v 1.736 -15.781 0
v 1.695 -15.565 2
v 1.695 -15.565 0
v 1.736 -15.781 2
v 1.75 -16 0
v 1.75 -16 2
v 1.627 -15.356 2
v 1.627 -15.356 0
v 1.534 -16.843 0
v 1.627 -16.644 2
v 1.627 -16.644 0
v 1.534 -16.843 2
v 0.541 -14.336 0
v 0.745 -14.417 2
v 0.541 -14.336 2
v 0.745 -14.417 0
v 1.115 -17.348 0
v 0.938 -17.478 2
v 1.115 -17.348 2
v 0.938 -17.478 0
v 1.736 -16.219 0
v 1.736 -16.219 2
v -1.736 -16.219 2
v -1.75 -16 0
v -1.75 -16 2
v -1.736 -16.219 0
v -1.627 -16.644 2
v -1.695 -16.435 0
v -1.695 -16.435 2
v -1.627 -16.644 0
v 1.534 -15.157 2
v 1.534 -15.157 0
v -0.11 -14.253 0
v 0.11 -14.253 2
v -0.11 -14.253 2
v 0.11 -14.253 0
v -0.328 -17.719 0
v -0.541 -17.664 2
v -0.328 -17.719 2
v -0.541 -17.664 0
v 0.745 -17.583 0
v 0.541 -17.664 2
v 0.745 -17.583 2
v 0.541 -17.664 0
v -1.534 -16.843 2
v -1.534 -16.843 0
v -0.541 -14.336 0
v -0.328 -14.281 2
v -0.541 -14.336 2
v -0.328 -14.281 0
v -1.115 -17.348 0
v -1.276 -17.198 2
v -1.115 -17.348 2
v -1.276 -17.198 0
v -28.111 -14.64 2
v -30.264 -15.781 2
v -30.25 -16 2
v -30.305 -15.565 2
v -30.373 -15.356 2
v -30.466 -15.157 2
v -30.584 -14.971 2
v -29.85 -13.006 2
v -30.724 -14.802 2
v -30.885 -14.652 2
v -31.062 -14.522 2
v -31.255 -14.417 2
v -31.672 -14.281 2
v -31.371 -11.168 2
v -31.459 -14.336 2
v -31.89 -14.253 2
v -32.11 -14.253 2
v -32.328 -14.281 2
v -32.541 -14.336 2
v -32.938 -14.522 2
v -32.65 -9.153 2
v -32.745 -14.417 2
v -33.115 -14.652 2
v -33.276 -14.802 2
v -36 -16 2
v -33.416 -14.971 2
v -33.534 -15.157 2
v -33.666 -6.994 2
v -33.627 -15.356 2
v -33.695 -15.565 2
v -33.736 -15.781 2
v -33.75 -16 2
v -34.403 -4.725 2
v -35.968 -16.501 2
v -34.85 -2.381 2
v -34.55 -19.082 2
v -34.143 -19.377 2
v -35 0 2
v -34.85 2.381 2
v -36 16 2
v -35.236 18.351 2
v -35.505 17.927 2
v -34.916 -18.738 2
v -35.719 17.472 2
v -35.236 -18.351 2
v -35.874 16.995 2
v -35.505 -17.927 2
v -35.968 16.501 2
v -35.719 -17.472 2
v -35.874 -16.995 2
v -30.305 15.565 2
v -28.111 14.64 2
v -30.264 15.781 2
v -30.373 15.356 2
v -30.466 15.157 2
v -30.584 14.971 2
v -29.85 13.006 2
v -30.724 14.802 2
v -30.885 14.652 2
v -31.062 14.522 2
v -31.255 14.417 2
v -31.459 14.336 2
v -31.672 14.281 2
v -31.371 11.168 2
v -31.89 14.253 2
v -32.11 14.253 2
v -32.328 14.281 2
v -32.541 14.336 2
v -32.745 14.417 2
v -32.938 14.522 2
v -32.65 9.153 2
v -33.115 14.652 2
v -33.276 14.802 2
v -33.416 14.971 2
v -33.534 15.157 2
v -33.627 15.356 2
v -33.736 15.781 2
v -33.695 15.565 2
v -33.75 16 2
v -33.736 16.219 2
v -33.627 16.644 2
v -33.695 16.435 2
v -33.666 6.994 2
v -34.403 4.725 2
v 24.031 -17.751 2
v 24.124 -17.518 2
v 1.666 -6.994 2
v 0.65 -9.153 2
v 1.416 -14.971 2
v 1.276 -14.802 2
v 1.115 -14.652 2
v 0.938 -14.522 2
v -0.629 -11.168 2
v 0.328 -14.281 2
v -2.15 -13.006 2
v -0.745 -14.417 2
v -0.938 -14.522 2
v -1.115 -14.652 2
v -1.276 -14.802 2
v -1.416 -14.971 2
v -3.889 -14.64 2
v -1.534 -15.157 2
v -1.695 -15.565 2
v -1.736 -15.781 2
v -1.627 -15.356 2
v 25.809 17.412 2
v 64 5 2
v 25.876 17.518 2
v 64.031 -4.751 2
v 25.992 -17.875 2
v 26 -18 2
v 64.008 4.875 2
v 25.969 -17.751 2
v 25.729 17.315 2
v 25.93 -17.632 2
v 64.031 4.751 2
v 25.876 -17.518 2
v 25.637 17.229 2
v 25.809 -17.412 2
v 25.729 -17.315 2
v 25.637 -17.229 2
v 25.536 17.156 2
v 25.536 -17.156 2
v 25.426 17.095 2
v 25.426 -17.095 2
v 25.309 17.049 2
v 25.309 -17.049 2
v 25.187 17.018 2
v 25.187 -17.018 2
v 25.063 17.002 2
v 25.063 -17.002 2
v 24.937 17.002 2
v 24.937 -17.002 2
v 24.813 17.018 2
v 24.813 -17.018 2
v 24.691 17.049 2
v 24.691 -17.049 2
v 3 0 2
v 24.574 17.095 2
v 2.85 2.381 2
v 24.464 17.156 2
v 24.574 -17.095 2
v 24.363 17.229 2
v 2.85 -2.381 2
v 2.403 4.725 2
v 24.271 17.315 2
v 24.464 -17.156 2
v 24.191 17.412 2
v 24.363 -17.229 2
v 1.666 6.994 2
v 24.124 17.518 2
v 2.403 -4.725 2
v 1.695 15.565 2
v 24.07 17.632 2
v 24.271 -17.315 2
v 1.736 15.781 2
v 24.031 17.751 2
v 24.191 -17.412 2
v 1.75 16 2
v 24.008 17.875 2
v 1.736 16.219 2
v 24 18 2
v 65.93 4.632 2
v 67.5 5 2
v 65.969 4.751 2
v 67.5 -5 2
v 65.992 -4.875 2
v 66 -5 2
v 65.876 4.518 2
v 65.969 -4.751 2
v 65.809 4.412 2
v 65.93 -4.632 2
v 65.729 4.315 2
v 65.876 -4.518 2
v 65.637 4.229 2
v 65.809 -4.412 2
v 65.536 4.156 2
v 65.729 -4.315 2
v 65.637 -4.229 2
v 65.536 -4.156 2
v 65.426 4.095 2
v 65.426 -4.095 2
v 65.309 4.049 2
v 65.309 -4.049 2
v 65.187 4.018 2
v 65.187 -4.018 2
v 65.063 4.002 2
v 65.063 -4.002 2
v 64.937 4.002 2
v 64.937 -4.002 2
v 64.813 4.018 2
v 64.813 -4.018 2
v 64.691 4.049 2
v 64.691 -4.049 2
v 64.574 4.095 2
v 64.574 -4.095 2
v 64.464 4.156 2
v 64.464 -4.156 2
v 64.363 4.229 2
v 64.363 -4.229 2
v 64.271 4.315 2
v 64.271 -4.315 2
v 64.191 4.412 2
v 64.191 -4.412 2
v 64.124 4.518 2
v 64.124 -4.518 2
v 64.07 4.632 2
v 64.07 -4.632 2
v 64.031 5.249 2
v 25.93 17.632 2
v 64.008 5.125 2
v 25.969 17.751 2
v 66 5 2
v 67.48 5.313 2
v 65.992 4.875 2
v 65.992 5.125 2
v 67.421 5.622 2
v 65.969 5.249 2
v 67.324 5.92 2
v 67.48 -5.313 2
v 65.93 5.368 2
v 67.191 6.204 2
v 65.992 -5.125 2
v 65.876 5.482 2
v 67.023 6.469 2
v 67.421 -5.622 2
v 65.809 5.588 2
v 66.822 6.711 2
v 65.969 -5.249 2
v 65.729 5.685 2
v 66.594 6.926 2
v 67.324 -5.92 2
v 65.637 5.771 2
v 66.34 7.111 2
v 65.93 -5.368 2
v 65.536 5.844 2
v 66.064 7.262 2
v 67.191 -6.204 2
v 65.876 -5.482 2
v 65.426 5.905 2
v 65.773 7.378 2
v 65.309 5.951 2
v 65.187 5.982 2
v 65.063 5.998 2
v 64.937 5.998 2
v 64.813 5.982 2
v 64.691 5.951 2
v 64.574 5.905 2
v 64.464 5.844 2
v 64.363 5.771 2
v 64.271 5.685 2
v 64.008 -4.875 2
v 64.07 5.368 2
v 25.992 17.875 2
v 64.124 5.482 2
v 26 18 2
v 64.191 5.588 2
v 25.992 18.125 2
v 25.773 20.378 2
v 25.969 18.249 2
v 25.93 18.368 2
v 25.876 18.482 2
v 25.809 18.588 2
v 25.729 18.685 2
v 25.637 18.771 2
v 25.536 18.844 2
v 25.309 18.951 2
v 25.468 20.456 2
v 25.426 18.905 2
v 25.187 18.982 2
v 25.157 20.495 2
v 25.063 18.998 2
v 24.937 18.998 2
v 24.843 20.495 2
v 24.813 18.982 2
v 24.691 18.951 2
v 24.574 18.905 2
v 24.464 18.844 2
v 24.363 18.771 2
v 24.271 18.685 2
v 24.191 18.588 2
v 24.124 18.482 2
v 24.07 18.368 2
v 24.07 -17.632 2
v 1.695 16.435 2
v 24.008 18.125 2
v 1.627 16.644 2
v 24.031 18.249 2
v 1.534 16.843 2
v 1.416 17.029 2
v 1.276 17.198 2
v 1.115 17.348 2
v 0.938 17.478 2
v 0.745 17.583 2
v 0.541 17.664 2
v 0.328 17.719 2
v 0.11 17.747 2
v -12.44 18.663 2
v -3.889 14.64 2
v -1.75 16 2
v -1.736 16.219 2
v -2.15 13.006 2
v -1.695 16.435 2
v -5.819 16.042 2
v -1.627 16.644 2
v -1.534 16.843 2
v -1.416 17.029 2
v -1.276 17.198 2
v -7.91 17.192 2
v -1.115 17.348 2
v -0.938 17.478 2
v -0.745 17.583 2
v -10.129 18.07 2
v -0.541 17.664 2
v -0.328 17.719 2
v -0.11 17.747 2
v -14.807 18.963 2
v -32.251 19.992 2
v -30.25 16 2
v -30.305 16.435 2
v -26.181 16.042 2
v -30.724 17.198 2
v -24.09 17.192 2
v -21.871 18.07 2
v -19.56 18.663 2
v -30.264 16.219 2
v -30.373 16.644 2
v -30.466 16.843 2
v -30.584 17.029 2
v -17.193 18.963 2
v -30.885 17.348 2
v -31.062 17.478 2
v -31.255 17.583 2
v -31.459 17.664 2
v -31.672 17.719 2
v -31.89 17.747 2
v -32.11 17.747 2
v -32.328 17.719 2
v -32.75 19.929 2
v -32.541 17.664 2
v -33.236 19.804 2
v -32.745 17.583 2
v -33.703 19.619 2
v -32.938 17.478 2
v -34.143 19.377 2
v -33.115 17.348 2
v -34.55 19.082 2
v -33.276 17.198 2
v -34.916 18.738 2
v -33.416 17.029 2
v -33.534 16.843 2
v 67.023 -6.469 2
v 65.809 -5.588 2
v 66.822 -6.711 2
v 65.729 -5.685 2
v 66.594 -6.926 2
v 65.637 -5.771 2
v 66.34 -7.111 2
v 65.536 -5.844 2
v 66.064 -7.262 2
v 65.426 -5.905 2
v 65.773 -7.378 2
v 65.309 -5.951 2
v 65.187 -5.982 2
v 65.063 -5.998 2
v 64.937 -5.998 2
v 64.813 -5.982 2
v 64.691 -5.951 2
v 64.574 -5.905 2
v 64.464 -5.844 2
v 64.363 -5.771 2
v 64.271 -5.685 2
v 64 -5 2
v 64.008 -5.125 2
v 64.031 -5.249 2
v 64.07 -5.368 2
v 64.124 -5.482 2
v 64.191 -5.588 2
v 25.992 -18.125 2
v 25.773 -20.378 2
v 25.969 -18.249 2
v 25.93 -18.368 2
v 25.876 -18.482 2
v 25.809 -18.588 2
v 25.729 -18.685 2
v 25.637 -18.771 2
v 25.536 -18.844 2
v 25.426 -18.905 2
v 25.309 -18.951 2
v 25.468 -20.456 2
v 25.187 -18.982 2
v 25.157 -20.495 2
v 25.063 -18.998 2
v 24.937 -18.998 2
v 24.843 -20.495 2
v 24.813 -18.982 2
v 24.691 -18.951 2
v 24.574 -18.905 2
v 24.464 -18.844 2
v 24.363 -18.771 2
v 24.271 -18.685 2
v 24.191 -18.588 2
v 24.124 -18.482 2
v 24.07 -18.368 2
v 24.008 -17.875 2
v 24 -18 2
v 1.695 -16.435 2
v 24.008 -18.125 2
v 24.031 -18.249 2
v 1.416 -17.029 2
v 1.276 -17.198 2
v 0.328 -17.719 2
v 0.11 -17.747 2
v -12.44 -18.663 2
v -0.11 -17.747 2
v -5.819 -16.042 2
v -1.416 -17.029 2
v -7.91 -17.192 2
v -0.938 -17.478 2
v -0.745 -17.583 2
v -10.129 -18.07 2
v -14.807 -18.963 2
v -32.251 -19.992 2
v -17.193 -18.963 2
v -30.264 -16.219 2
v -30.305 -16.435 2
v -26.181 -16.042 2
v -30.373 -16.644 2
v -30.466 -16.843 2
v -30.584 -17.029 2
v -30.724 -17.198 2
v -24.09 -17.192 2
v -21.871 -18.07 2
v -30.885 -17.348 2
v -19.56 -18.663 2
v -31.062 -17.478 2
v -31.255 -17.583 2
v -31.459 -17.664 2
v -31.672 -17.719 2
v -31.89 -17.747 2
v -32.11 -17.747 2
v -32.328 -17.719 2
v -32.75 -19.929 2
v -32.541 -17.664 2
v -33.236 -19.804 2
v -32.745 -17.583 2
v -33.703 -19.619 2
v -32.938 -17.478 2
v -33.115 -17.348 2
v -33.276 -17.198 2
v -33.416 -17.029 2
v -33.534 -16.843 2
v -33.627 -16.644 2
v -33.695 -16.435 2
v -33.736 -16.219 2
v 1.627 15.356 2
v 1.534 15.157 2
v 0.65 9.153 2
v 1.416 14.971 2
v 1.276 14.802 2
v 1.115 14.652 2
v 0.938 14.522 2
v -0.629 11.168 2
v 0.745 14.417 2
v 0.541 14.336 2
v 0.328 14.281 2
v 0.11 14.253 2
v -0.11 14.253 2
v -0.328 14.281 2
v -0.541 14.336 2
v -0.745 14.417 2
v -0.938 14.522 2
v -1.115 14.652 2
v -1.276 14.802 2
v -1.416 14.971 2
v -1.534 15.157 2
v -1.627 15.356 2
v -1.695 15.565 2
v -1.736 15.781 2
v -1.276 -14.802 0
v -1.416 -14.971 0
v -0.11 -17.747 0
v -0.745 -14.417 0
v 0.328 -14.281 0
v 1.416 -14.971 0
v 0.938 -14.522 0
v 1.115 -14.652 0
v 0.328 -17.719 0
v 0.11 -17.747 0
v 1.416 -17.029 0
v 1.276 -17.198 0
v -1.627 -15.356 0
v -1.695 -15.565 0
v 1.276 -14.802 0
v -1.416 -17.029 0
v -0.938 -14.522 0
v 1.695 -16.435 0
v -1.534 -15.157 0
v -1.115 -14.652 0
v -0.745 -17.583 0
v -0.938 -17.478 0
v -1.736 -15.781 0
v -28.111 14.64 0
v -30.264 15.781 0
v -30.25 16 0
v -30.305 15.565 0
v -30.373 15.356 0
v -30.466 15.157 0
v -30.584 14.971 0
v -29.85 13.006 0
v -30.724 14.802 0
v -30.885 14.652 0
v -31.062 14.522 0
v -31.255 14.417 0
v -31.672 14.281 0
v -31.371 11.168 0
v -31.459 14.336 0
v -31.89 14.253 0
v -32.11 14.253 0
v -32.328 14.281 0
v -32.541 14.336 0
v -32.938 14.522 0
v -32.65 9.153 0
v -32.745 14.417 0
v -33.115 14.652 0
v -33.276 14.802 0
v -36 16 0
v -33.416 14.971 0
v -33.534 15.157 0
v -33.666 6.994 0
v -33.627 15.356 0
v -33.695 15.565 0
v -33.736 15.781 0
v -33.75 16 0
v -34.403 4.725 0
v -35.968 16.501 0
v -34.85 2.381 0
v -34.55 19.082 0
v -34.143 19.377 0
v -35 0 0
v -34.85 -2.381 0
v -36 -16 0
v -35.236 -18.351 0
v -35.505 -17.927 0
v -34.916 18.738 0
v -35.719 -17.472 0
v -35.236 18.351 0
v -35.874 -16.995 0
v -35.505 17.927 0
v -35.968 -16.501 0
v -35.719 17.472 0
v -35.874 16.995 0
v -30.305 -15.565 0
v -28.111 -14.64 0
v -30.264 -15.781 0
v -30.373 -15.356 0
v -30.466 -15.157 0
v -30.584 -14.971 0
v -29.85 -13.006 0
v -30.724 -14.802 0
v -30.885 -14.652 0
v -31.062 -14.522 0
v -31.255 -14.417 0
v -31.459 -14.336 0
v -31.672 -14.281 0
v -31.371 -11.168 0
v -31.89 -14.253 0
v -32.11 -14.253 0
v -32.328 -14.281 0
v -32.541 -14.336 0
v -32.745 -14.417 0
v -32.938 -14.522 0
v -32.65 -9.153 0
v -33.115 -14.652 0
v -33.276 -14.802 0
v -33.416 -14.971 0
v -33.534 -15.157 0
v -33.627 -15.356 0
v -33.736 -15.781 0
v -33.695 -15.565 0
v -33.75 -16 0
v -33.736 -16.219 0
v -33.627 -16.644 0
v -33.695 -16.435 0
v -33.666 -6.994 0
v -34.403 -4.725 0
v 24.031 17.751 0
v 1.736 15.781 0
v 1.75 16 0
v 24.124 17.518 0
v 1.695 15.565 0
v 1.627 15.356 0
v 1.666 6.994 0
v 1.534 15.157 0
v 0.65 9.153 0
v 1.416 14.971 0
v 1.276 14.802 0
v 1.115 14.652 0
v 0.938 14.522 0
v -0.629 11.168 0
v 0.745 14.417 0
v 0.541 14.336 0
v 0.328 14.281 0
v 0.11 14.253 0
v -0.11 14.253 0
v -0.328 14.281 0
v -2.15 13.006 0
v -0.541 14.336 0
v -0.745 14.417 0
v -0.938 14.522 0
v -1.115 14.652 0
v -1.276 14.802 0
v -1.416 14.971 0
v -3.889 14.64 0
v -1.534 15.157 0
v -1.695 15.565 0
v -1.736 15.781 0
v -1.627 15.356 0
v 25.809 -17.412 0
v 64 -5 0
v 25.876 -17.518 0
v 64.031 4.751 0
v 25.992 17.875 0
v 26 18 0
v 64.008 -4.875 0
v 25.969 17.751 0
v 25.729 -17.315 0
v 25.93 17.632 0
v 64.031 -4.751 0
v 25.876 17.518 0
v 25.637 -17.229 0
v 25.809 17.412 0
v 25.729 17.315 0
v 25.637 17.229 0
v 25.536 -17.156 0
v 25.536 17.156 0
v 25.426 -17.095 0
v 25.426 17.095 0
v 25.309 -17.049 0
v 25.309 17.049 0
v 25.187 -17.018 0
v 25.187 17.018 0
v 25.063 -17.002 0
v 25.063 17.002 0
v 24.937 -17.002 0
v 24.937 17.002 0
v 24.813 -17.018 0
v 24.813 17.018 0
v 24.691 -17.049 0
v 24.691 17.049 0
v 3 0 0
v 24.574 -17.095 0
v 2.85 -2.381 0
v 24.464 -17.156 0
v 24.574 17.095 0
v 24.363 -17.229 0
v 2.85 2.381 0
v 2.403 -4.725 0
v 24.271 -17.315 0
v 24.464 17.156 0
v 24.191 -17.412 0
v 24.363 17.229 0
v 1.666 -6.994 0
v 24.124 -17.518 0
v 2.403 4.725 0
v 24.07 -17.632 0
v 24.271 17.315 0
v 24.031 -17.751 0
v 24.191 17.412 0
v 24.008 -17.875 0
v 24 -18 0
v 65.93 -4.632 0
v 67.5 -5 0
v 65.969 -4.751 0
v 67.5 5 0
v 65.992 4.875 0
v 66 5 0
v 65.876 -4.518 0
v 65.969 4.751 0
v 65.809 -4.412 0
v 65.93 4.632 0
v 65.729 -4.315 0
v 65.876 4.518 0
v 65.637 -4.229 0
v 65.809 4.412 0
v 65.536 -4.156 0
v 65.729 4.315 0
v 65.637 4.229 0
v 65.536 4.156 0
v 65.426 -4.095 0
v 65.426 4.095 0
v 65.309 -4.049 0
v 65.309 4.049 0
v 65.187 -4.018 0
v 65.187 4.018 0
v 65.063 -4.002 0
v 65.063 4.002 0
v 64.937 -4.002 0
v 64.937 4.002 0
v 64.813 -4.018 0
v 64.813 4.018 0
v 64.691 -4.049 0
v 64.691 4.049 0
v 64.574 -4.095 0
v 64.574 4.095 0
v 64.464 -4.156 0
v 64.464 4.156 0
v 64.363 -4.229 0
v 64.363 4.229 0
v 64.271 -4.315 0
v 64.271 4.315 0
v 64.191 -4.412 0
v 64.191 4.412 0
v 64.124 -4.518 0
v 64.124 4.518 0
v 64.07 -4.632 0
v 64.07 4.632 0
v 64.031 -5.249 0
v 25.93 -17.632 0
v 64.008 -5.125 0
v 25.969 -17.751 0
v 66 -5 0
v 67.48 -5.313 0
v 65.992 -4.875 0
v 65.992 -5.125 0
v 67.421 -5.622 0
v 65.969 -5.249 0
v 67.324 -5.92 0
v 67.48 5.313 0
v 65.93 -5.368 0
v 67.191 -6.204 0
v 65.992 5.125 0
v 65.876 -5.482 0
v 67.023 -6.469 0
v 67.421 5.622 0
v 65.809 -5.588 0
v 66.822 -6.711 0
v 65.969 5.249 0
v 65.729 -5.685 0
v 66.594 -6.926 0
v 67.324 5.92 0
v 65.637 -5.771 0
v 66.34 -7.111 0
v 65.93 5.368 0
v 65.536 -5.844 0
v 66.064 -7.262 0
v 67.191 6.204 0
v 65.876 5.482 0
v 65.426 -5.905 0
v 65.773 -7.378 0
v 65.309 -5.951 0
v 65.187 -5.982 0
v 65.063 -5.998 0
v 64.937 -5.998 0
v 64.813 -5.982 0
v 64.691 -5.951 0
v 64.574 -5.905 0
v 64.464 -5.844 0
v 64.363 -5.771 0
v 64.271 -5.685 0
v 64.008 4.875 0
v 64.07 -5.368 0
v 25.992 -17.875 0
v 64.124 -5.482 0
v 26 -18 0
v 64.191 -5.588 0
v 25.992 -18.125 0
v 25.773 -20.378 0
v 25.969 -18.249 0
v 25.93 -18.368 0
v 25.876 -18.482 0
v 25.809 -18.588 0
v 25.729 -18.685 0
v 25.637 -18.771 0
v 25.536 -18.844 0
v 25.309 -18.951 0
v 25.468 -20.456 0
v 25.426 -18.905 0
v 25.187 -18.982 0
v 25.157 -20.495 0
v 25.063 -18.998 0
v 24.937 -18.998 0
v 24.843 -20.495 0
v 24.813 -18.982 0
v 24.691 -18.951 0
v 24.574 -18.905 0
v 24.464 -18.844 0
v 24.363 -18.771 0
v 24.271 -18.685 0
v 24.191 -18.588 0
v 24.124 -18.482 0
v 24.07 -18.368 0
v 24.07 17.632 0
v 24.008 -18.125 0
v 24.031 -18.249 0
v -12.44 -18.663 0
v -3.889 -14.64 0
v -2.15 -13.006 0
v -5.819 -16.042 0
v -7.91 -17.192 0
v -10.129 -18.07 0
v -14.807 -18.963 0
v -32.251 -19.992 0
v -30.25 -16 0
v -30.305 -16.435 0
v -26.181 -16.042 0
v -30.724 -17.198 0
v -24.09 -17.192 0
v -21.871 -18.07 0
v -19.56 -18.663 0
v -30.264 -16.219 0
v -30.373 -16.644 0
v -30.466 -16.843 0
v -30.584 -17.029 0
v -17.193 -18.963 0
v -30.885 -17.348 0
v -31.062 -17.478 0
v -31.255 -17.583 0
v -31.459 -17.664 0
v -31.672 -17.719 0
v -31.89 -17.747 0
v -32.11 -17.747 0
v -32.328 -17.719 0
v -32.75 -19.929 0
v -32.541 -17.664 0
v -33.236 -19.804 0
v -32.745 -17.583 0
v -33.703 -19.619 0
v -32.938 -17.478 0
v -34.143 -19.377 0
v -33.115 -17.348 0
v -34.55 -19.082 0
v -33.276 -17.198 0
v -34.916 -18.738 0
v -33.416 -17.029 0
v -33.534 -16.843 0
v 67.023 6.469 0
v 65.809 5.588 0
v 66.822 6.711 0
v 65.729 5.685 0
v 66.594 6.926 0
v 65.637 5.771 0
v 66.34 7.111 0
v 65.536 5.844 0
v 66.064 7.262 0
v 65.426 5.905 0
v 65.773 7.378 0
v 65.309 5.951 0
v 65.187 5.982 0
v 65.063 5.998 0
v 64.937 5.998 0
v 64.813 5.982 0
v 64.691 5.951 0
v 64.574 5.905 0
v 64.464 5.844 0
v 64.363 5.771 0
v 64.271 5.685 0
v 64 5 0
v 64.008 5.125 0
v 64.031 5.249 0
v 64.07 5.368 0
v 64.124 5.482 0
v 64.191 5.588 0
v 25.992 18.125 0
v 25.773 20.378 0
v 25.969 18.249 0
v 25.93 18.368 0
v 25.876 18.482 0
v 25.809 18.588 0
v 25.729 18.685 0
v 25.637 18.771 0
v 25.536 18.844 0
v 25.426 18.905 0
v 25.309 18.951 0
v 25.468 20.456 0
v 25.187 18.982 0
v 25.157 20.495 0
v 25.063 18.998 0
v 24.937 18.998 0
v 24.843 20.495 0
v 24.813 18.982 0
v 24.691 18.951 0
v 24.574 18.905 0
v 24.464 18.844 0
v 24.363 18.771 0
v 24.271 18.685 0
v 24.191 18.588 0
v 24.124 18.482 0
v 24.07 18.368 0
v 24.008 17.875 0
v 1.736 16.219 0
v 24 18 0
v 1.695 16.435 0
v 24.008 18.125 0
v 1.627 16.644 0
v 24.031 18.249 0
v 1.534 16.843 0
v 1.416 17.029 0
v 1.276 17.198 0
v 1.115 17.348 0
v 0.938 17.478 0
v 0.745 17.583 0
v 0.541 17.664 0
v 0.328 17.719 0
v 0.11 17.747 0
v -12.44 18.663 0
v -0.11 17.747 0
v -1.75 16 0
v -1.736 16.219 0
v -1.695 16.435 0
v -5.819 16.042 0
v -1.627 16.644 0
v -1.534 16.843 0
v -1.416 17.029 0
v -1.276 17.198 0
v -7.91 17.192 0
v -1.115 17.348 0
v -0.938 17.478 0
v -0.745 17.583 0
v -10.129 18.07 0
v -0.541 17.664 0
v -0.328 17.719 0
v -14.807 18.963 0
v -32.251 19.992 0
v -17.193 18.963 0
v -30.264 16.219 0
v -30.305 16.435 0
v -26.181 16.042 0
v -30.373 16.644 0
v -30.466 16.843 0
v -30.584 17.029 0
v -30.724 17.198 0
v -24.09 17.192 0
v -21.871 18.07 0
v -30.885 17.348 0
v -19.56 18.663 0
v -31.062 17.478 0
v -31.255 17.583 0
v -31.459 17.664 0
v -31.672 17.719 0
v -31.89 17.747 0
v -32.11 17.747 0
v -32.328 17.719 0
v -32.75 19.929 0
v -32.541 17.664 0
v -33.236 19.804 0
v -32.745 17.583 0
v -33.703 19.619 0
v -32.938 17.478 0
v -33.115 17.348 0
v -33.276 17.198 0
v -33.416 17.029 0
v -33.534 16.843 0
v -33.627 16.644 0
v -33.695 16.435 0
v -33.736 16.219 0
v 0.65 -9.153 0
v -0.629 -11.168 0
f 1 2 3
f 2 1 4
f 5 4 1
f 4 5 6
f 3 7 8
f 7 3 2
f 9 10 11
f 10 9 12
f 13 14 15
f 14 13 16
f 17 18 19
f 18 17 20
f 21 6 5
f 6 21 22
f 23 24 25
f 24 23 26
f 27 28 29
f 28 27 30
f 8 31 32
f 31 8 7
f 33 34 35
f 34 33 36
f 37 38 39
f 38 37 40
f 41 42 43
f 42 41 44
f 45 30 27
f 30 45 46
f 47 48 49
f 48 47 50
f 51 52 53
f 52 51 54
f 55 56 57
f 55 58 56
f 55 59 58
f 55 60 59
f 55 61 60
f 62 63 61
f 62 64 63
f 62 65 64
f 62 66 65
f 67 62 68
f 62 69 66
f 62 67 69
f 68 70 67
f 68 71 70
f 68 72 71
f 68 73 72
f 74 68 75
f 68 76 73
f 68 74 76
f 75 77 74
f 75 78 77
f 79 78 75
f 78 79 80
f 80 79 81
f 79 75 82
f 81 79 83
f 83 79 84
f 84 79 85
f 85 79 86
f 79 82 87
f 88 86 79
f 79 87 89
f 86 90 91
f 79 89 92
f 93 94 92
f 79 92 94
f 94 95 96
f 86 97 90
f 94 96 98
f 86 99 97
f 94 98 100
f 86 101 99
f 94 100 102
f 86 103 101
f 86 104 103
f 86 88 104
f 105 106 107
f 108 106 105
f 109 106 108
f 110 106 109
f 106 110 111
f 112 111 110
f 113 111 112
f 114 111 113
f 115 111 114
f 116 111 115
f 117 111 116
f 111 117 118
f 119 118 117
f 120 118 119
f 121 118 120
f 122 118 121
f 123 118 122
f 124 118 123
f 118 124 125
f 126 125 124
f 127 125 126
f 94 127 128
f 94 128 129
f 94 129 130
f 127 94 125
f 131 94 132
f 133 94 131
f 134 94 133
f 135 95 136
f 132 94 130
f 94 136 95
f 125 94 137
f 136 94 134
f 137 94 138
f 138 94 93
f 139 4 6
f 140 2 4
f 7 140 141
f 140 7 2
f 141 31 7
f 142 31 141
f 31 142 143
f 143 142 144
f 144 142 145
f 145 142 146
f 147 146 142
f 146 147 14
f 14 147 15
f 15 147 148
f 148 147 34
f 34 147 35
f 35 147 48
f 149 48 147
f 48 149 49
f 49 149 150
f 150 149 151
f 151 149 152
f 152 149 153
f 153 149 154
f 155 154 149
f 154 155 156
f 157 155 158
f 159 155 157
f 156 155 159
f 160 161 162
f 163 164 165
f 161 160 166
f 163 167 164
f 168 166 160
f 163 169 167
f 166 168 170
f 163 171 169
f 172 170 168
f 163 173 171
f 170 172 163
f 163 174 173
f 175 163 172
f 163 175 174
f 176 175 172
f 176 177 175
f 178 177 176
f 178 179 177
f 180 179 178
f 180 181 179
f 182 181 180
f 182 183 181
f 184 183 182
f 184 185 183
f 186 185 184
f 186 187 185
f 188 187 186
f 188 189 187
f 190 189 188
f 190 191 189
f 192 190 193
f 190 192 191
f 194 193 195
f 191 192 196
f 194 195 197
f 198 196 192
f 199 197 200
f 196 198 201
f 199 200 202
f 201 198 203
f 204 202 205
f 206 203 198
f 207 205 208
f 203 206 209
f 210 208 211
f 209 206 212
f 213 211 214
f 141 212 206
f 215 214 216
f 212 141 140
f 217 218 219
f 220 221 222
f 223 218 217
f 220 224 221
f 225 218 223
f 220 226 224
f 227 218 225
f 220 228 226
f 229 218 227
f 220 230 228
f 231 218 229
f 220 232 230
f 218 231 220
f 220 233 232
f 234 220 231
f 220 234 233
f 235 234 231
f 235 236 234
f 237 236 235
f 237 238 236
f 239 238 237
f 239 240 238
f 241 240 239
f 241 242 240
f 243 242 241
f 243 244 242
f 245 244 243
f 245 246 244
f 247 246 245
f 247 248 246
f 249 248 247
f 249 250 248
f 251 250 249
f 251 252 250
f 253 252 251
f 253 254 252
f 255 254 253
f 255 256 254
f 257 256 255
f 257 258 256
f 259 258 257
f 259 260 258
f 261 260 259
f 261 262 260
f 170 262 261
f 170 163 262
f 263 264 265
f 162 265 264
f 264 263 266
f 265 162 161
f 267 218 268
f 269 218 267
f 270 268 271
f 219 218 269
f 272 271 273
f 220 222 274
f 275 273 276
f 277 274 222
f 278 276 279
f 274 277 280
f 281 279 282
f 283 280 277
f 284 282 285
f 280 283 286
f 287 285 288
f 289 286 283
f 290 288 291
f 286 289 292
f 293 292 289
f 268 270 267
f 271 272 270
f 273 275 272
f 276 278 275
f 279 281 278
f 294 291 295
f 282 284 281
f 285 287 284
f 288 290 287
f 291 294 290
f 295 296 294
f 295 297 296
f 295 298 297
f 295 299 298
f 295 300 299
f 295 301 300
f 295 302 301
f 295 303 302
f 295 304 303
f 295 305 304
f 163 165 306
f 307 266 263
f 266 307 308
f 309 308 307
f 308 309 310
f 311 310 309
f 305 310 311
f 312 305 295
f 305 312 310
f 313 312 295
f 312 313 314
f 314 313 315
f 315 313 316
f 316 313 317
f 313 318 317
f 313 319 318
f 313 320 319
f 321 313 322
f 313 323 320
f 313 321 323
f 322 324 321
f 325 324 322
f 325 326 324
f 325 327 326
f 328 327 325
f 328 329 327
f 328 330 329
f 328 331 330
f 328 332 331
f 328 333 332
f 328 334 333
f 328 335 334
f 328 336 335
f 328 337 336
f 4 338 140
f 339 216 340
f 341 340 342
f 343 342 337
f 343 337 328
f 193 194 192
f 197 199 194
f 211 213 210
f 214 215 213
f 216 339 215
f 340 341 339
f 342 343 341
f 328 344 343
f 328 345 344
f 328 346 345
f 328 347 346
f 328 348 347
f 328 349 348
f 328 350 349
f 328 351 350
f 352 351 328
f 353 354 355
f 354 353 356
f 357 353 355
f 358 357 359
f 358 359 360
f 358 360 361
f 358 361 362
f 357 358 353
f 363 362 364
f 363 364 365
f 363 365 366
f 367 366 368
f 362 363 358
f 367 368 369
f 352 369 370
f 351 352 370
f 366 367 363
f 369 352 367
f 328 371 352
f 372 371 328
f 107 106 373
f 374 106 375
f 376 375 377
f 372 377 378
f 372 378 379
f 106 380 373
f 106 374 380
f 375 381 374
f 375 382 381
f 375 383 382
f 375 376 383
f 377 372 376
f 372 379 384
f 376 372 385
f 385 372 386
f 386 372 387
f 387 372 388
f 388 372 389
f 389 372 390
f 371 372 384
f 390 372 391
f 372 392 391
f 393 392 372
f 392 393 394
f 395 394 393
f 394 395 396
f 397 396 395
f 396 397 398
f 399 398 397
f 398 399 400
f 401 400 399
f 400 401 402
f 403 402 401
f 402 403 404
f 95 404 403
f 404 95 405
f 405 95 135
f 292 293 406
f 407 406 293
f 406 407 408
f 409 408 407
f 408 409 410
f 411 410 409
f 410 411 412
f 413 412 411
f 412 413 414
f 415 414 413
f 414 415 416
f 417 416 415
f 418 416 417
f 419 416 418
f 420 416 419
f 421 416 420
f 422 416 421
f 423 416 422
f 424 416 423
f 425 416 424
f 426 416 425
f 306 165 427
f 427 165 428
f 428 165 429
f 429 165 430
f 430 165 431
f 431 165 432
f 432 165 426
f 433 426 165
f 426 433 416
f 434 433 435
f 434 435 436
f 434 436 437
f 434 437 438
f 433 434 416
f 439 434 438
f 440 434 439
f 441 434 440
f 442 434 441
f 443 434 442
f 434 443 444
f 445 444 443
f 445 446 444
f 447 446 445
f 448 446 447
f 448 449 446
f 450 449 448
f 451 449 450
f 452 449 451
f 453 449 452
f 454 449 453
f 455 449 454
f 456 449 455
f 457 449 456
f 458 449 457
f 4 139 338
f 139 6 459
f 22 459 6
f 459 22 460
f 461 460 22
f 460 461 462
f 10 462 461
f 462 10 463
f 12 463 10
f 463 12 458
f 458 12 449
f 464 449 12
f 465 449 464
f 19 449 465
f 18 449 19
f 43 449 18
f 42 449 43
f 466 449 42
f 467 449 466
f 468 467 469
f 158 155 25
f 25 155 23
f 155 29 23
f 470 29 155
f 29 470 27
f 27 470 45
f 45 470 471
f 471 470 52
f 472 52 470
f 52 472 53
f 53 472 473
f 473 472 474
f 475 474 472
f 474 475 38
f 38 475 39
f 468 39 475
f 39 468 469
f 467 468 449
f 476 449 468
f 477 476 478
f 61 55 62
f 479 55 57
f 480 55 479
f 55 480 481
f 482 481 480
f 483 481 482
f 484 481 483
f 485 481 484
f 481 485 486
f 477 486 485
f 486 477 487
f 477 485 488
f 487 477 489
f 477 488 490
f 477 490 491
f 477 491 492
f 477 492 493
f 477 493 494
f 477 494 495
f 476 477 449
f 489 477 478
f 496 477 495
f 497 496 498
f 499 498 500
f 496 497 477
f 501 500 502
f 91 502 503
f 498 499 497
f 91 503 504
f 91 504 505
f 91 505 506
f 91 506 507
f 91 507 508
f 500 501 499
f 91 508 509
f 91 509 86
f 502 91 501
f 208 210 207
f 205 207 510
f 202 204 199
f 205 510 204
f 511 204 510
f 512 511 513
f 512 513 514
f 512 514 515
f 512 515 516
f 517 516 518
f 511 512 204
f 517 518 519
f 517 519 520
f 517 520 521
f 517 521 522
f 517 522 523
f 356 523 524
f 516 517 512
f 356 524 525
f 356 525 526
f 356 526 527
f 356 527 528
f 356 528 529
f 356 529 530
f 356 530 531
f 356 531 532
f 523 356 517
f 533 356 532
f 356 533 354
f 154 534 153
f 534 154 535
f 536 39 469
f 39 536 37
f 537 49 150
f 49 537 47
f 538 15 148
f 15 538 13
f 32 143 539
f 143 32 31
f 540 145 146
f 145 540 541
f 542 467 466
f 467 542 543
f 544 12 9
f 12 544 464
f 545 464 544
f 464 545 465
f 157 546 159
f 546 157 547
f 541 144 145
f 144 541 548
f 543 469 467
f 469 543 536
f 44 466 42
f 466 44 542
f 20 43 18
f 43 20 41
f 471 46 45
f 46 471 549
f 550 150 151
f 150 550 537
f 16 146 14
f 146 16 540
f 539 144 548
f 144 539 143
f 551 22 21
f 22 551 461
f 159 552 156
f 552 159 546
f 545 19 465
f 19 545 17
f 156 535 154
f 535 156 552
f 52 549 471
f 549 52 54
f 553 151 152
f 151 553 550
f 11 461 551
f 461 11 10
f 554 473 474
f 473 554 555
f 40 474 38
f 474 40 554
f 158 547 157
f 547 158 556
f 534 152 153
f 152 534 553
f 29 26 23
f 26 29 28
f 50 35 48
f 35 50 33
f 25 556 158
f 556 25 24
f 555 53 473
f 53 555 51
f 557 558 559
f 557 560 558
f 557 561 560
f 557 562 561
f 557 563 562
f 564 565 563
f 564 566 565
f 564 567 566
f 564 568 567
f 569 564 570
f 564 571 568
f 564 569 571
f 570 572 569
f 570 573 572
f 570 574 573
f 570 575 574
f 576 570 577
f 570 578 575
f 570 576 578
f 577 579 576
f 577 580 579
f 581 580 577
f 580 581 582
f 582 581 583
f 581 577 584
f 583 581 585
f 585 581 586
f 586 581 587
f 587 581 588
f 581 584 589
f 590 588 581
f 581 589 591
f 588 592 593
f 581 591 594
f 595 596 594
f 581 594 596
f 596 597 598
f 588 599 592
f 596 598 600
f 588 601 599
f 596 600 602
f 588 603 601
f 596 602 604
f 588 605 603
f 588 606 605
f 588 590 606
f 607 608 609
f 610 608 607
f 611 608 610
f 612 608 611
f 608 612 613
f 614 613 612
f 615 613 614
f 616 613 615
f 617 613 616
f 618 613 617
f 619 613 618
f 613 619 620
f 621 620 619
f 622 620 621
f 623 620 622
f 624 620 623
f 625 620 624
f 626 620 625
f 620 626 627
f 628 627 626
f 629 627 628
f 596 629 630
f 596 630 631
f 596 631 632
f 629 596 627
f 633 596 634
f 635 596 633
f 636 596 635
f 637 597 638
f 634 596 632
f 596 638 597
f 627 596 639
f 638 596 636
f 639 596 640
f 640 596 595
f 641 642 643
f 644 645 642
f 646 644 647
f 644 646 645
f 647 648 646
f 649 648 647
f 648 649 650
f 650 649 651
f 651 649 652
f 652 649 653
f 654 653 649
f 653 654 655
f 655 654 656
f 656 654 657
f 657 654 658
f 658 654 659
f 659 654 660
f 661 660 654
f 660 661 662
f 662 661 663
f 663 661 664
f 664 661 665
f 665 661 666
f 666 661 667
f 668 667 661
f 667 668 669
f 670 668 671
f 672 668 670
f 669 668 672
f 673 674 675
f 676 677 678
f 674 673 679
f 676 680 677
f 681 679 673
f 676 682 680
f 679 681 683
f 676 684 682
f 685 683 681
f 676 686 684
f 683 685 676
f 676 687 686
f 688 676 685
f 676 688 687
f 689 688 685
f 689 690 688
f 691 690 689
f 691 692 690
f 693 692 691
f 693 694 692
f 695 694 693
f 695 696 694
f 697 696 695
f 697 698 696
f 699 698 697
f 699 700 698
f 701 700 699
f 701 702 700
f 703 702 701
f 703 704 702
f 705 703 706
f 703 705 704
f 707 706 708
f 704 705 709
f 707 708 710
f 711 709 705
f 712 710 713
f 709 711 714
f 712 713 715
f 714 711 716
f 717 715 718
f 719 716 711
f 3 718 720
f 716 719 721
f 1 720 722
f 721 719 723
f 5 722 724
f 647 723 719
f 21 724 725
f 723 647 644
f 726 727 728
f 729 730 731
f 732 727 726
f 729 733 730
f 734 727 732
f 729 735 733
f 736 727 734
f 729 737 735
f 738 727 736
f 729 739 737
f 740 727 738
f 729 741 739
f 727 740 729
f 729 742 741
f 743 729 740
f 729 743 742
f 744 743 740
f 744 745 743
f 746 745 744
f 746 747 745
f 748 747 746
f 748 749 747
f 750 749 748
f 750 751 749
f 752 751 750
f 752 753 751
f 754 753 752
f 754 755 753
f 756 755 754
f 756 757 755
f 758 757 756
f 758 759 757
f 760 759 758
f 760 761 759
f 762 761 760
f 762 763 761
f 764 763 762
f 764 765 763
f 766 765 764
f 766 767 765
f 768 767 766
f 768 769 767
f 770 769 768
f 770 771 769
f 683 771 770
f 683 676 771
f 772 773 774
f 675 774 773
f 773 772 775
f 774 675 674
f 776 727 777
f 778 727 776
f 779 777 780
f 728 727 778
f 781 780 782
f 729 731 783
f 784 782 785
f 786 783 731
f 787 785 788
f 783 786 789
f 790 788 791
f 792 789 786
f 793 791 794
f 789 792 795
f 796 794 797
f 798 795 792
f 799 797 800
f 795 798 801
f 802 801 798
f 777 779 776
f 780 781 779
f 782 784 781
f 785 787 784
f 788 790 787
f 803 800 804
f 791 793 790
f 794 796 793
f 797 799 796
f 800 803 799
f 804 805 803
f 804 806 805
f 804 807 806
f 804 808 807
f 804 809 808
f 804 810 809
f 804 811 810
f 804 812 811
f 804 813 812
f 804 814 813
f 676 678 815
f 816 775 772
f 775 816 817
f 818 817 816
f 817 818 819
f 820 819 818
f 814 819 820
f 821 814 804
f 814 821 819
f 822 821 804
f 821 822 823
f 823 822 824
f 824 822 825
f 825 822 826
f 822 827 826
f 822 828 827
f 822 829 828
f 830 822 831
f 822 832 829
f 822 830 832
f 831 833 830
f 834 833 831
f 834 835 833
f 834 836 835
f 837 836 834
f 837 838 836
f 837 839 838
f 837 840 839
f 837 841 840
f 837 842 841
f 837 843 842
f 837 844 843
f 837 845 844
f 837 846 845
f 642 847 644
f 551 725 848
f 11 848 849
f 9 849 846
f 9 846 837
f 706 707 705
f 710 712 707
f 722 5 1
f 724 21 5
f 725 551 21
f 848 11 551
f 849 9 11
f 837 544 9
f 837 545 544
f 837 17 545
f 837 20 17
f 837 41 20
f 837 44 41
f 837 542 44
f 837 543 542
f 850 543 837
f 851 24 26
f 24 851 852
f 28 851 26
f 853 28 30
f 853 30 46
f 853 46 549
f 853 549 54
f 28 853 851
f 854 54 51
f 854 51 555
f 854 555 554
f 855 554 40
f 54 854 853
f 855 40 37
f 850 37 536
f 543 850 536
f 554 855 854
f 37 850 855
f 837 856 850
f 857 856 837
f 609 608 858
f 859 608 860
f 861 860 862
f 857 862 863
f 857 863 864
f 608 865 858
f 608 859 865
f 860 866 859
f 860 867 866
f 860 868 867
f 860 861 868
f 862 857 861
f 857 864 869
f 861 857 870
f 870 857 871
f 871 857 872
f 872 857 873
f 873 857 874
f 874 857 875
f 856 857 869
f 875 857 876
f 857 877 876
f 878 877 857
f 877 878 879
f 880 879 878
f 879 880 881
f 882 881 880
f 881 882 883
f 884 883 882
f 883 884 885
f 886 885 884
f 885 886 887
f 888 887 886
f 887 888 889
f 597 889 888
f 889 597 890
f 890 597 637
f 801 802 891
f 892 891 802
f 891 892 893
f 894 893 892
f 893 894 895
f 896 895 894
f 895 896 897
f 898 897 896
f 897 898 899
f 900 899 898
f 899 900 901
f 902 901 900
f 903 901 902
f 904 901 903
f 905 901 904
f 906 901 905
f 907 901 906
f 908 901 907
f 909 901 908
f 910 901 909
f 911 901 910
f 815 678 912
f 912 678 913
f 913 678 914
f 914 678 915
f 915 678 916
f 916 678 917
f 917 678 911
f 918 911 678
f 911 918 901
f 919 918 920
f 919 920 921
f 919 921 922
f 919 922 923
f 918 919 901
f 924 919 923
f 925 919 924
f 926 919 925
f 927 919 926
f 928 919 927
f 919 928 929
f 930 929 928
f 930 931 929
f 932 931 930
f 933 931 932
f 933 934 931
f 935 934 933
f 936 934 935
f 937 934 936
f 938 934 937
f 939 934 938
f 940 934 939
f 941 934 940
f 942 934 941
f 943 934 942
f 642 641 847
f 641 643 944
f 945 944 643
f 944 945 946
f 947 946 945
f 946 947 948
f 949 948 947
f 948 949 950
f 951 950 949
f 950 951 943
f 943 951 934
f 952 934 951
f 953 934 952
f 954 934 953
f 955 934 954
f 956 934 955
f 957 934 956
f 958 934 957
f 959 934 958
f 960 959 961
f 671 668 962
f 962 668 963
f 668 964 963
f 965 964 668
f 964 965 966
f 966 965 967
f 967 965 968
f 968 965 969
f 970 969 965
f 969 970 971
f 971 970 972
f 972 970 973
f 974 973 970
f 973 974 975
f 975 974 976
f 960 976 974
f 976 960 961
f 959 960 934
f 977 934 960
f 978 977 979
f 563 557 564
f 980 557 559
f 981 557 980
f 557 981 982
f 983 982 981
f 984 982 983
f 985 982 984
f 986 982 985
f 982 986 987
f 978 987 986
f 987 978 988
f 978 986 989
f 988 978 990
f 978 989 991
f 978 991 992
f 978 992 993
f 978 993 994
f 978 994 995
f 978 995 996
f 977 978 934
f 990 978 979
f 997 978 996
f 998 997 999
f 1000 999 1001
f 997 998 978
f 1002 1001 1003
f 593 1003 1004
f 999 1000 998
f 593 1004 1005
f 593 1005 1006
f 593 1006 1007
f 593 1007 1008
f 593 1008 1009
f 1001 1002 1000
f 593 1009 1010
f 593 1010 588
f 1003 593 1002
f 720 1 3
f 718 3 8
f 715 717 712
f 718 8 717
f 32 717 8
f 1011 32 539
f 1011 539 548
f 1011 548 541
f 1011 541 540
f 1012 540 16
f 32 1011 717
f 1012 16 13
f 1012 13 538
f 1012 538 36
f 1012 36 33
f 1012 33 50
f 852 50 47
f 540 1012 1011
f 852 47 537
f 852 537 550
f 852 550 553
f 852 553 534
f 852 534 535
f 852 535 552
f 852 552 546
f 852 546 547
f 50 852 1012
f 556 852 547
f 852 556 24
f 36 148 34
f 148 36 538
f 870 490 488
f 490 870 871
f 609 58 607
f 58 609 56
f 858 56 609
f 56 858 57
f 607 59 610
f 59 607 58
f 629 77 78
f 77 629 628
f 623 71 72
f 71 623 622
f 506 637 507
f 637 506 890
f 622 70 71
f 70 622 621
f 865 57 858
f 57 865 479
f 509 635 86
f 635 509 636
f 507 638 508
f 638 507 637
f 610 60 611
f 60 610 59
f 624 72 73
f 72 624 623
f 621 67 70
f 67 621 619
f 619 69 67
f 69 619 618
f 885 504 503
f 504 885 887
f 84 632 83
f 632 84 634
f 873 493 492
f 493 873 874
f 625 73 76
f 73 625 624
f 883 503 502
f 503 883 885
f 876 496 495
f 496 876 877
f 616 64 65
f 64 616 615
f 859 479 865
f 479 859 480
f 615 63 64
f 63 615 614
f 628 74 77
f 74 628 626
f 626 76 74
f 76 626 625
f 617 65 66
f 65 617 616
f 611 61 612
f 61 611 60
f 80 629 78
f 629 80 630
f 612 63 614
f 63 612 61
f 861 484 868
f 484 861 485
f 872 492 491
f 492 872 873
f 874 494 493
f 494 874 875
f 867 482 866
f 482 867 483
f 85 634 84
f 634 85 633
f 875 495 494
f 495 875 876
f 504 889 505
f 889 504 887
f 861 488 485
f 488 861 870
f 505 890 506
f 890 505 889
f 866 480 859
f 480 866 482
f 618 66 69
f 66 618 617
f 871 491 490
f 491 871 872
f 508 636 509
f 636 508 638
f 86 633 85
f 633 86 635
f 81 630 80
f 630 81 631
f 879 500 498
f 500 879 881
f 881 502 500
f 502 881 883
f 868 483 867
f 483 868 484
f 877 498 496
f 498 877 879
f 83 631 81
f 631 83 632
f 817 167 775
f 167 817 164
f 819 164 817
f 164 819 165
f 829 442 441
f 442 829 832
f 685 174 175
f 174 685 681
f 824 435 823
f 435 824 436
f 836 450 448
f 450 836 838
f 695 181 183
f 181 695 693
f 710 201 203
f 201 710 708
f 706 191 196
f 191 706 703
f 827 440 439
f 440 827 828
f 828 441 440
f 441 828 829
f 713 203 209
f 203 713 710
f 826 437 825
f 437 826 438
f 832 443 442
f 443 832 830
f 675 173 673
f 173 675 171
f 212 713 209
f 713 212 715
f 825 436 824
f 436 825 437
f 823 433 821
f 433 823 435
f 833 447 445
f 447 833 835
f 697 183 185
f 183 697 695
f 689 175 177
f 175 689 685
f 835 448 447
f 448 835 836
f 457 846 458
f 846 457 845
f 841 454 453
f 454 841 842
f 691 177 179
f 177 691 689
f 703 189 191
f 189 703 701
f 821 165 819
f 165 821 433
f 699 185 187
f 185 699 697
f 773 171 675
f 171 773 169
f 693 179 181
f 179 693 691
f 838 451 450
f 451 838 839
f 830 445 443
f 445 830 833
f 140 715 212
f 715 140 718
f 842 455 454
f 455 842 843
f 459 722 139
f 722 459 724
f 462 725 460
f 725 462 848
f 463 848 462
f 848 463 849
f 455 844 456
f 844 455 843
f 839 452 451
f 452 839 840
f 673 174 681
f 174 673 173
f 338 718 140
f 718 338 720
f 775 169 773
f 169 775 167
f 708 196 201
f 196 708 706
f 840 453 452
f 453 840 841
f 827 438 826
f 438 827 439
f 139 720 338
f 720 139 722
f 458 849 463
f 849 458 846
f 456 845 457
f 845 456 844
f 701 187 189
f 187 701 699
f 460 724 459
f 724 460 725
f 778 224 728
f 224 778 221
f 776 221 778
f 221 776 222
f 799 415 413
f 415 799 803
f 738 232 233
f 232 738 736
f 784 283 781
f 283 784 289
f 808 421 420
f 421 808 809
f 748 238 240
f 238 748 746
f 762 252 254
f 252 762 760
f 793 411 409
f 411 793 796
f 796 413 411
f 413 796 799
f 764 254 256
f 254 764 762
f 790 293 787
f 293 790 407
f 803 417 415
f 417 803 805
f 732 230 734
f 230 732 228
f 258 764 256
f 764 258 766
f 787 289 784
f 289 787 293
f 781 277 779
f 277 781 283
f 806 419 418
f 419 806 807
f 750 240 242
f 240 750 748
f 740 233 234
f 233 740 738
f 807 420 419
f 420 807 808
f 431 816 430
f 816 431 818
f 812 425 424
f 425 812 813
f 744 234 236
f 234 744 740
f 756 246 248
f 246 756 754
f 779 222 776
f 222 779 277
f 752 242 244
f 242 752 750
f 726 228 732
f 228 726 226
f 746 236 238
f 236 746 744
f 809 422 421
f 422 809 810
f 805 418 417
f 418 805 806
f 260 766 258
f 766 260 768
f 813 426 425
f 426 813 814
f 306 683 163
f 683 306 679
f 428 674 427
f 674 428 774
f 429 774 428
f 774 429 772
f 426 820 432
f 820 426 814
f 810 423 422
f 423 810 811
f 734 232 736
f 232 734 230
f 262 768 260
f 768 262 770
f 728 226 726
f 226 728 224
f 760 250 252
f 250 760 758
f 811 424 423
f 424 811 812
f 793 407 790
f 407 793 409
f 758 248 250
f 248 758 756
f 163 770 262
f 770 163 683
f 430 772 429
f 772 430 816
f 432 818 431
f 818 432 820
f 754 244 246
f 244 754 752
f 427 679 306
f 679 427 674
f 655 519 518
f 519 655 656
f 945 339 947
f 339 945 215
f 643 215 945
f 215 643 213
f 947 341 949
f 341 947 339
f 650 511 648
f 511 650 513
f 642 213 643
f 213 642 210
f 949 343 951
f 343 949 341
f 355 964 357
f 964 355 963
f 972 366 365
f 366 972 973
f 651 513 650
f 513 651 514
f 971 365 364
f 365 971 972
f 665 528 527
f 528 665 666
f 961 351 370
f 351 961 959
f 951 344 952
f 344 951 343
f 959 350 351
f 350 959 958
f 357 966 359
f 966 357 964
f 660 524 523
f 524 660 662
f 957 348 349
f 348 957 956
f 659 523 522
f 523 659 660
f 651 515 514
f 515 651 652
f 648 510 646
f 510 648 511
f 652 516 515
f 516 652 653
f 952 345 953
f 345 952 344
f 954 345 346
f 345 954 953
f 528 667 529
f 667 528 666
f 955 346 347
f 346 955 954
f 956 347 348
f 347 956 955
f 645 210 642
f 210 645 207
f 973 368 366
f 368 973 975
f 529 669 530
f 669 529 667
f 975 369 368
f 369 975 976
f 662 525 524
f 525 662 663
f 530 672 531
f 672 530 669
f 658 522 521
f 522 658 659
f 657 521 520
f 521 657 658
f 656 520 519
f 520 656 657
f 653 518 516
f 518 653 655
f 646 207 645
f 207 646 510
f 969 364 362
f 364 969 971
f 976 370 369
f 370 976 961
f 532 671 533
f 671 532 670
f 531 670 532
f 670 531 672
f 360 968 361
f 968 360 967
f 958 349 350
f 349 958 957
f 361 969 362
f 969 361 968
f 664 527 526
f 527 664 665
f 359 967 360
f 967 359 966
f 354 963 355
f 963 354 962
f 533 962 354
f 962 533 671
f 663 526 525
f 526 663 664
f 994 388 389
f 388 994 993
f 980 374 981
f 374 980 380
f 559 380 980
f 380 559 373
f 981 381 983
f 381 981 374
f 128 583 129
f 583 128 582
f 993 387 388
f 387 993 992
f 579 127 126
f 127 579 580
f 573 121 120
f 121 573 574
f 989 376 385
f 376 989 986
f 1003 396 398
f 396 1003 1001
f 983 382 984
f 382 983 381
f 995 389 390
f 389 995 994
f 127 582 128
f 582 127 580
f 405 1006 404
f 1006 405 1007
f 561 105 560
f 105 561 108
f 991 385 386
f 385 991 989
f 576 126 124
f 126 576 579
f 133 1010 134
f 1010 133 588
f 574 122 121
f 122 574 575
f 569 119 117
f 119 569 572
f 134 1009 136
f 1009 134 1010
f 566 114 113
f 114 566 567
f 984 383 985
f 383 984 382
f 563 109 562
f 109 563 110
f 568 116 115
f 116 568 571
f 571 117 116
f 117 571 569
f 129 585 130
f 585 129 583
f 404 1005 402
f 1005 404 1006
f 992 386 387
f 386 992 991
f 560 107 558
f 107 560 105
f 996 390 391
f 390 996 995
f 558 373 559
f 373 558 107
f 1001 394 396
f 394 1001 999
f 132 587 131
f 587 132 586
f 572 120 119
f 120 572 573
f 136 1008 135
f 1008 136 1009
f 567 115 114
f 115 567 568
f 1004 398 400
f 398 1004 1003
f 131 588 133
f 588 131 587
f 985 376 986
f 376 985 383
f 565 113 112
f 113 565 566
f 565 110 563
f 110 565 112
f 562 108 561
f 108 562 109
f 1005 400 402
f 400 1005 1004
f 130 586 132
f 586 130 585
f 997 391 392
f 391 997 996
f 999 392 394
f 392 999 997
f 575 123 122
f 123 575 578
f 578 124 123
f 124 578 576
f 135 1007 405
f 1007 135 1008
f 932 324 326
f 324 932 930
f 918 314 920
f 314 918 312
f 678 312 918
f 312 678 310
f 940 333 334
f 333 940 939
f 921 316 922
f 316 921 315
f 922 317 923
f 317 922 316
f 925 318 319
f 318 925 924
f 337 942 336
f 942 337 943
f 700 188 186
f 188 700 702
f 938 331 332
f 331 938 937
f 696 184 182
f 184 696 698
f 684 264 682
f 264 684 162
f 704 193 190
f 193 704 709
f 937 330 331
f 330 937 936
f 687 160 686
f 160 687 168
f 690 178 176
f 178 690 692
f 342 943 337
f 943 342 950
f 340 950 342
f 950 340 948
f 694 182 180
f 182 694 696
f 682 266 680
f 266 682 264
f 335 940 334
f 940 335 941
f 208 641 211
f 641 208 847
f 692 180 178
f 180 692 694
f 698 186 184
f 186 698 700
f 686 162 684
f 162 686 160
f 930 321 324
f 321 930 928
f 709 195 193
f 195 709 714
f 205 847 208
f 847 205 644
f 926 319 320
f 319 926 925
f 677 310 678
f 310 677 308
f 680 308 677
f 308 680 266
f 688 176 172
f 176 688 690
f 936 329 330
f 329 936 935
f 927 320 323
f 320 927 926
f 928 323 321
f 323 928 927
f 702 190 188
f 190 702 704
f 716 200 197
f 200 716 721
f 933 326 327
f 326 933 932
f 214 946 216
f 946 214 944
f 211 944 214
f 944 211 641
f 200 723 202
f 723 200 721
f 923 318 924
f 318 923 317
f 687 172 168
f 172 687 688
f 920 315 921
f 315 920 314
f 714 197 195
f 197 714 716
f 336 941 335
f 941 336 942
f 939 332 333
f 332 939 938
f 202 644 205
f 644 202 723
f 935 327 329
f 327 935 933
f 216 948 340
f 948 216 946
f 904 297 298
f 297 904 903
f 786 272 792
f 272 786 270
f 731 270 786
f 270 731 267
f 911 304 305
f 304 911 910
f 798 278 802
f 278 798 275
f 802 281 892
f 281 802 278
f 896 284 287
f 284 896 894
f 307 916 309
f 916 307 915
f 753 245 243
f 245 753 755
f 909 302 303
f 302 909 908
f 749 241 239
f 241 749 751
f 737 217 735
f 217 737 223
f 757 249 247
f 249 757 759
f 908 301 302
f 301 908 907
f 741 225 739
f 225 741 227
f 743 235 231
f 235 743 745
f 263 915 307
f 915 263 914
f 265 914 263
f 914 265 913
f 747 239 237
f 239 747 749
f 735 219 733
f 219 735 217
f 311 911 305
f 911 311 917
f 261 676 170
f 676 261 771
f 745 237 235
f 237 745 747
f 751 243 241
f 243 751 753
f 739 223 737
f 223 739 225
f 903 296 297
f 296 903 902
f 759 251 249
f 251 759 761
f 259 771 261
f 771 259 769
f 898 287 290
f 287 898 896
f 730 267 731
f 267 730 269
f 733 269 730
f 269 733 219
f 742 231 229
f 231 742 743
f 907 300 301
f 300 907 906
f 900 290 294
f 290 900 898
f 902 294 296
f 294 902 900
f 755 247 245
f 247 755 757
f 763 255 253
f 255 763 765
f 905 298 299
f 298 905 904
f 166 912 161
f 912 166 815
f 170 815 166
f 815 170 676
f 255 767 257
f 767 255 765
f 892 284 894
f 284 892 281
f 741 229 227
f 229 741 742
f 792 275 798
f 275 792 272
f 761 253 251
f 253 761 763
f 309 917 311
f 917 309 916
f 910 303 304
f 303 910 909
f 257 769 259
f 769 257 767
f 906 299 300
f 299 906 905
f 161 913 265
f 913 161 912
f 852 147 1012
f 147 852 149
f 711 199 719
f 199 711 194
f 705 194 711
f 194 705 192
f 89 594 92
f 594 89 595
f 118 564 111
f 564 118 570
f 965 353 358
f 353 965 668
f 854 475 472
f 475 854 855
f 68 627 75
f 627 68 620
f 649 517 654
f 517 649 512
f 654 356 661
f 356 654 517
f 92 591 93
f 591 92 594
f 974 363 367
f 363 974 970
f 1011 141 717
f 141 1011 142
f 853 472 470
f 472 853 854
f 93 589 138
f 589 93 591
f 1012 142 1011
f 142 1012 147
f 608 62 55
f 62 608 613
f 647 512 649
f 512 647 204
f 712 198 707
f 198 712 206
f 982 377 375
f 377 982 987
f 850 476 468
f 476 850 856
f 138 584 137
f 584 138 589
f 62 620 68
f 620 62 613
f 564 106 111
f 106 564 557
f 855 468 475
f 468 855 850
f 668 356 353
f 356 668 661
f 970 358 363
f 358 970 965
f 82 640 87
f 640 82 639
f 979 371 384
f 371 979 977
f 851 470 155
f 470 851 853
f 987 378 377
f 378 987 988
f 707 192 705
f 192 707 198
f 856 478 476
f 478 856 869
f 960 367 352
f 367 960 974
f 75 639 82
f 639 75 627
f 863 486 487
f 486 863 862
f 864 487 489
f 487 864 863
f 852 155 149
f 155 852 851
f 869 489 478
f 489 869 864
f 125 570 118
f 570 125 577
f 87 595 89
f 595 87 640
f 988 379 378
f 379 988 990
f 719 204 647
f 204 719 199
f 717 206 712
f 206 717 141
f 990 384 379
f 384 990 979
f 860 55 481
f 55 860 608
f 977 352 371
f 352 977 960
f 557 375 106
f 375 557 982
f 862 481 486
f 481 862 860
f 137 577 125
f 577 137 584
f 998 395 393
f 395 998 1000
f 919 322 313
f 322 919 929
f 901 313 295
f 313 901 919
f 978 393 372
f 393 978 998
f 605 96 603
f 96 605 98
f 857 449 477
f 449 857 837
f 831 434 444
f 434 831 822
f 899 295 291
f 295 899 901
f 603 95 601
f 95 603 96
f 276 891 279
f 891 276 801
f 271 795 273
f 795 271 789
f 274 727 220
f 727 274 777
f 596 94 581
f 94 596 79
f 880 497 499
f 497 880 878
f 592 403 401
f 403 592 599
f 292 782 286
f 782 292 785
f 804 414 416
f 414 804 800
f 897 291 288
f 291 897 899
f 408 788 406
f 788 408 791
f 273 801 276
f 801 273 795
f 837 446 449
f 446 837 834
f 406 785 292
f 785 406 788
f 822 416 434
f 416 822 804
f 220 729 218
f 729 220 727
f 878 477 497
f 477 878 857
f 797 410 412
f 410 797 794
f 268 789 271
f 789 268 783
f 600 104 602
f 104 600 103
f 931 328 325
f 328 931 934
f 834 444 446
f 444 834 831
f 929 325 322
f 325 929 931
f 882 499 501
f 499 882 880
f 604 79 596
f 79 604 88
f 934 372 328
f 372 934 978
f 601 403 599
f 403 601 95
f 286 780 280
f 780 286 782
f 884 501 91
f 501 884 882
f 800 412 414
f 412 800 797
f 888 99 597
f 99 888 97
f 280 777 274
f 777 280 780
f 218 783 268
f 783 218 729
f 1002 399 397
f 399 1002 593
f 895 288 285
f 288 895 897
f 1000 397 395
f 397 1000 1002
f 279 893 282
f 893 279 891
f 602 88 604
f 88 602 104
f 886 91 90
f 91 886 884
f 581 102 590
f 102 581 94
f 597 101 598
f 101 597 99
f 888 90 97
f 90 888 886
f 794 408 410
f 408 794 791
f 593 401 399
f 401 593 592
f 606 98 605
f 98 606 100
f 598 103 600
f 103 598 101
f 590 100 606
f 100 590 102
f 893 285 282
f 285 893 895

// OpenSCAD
MOUNT_HOLE_SPACING = 36;
MOUNT_HOLE_DIA = 2;
MOUNT_HOLE_HEAD_DIA = 5;
MOUNT_HOLE_OFFSET_X = 25;
MOUNT_HOLE_OFFSET_Y = 0;

FAN_DIA = 38;
FAN_HOLE_DIA = 3.5;
FAN_HOLE_SPACING = 32;
FAN_HOLE_HEAD_DIA = 8;

STRAIN_RELIEF_WIDTH = 10;
STRAIN_RELIEF_LENGTH = 65;
STRAIN_RELIEF_DIA = 5;
STRAIN_RELIEF_HOLE_DIA = 2;

THICKNESS = 2;

BOTTOM = true;

$fn = 50;

module body() {
  hull() {
    for(i = [-1, 1]) {
      translate([0, i * FAN_HOLE_SPACING/2, 0])
      cylinder(d = FAN_HOLE_HEAD_DIA, h = THICKNESS);

      if(BOTTOM) {
        translate([-FAN_HOLE_SPACING, i * FAN_HOLE_SPACING/2, 0])
        cylinder(d = FAN_HOLE_HEAD_DIA, h = THICKNESS);
      }

      translate([MOUNT_HOLE_OFFSET_X, MOUNT_HOLE_OFFSET_Y + i * MOUNT_HOLE_SPACING/2, 0])
      cylinder(d = MOUNT_HOLE_HEAD_DIA, h = THICKNESS);

      translate([STRAIN_RELIEF_LENGTH, i * STRAIN_RELIEF_WIDTH/2, 0])
      cylinder(d = STRAIN_RELIEF_DIA, h = THICKNESS);
    }
  }
}

module holes() {
  for(i = [-1, 1]) {
    translate([0, i * FAN_HOLE_SPACING/2, 0])
    cylinder(d = FAN_HOLE_DIA, h = THICKNESS);

    translate([-FAN_HOLE_SPACING, i * FAN_HOLE_SPACING/2, 0])
    cylinder(d = FAN_HOLE_DIA, h = THICKNESS);

    translate([MOUNT_HOLE_OFFSET_X, MOUNT_HOLE_OFFSET_Y + i * MOUNT_HOLE_SPACING/2, 0])
    cylinder(d = MOUNT_HOLE_DIA, h = THICKNESS);

    translate([STRAIN_RELIEF_LENGTH, i * STRAIN_RELIEF_WIDTH/2, 0])
    cylinder(d = STRAIN_RELIEF_HOLE_DIA, h = THICKNESS);
  }
  translate([-FAN_HOLE_SPACING/2, 0, 0])
  cylinder(d = FAN_DIA, h = THICKNESS);
}

difference() {
  body();
  #holes();
}
